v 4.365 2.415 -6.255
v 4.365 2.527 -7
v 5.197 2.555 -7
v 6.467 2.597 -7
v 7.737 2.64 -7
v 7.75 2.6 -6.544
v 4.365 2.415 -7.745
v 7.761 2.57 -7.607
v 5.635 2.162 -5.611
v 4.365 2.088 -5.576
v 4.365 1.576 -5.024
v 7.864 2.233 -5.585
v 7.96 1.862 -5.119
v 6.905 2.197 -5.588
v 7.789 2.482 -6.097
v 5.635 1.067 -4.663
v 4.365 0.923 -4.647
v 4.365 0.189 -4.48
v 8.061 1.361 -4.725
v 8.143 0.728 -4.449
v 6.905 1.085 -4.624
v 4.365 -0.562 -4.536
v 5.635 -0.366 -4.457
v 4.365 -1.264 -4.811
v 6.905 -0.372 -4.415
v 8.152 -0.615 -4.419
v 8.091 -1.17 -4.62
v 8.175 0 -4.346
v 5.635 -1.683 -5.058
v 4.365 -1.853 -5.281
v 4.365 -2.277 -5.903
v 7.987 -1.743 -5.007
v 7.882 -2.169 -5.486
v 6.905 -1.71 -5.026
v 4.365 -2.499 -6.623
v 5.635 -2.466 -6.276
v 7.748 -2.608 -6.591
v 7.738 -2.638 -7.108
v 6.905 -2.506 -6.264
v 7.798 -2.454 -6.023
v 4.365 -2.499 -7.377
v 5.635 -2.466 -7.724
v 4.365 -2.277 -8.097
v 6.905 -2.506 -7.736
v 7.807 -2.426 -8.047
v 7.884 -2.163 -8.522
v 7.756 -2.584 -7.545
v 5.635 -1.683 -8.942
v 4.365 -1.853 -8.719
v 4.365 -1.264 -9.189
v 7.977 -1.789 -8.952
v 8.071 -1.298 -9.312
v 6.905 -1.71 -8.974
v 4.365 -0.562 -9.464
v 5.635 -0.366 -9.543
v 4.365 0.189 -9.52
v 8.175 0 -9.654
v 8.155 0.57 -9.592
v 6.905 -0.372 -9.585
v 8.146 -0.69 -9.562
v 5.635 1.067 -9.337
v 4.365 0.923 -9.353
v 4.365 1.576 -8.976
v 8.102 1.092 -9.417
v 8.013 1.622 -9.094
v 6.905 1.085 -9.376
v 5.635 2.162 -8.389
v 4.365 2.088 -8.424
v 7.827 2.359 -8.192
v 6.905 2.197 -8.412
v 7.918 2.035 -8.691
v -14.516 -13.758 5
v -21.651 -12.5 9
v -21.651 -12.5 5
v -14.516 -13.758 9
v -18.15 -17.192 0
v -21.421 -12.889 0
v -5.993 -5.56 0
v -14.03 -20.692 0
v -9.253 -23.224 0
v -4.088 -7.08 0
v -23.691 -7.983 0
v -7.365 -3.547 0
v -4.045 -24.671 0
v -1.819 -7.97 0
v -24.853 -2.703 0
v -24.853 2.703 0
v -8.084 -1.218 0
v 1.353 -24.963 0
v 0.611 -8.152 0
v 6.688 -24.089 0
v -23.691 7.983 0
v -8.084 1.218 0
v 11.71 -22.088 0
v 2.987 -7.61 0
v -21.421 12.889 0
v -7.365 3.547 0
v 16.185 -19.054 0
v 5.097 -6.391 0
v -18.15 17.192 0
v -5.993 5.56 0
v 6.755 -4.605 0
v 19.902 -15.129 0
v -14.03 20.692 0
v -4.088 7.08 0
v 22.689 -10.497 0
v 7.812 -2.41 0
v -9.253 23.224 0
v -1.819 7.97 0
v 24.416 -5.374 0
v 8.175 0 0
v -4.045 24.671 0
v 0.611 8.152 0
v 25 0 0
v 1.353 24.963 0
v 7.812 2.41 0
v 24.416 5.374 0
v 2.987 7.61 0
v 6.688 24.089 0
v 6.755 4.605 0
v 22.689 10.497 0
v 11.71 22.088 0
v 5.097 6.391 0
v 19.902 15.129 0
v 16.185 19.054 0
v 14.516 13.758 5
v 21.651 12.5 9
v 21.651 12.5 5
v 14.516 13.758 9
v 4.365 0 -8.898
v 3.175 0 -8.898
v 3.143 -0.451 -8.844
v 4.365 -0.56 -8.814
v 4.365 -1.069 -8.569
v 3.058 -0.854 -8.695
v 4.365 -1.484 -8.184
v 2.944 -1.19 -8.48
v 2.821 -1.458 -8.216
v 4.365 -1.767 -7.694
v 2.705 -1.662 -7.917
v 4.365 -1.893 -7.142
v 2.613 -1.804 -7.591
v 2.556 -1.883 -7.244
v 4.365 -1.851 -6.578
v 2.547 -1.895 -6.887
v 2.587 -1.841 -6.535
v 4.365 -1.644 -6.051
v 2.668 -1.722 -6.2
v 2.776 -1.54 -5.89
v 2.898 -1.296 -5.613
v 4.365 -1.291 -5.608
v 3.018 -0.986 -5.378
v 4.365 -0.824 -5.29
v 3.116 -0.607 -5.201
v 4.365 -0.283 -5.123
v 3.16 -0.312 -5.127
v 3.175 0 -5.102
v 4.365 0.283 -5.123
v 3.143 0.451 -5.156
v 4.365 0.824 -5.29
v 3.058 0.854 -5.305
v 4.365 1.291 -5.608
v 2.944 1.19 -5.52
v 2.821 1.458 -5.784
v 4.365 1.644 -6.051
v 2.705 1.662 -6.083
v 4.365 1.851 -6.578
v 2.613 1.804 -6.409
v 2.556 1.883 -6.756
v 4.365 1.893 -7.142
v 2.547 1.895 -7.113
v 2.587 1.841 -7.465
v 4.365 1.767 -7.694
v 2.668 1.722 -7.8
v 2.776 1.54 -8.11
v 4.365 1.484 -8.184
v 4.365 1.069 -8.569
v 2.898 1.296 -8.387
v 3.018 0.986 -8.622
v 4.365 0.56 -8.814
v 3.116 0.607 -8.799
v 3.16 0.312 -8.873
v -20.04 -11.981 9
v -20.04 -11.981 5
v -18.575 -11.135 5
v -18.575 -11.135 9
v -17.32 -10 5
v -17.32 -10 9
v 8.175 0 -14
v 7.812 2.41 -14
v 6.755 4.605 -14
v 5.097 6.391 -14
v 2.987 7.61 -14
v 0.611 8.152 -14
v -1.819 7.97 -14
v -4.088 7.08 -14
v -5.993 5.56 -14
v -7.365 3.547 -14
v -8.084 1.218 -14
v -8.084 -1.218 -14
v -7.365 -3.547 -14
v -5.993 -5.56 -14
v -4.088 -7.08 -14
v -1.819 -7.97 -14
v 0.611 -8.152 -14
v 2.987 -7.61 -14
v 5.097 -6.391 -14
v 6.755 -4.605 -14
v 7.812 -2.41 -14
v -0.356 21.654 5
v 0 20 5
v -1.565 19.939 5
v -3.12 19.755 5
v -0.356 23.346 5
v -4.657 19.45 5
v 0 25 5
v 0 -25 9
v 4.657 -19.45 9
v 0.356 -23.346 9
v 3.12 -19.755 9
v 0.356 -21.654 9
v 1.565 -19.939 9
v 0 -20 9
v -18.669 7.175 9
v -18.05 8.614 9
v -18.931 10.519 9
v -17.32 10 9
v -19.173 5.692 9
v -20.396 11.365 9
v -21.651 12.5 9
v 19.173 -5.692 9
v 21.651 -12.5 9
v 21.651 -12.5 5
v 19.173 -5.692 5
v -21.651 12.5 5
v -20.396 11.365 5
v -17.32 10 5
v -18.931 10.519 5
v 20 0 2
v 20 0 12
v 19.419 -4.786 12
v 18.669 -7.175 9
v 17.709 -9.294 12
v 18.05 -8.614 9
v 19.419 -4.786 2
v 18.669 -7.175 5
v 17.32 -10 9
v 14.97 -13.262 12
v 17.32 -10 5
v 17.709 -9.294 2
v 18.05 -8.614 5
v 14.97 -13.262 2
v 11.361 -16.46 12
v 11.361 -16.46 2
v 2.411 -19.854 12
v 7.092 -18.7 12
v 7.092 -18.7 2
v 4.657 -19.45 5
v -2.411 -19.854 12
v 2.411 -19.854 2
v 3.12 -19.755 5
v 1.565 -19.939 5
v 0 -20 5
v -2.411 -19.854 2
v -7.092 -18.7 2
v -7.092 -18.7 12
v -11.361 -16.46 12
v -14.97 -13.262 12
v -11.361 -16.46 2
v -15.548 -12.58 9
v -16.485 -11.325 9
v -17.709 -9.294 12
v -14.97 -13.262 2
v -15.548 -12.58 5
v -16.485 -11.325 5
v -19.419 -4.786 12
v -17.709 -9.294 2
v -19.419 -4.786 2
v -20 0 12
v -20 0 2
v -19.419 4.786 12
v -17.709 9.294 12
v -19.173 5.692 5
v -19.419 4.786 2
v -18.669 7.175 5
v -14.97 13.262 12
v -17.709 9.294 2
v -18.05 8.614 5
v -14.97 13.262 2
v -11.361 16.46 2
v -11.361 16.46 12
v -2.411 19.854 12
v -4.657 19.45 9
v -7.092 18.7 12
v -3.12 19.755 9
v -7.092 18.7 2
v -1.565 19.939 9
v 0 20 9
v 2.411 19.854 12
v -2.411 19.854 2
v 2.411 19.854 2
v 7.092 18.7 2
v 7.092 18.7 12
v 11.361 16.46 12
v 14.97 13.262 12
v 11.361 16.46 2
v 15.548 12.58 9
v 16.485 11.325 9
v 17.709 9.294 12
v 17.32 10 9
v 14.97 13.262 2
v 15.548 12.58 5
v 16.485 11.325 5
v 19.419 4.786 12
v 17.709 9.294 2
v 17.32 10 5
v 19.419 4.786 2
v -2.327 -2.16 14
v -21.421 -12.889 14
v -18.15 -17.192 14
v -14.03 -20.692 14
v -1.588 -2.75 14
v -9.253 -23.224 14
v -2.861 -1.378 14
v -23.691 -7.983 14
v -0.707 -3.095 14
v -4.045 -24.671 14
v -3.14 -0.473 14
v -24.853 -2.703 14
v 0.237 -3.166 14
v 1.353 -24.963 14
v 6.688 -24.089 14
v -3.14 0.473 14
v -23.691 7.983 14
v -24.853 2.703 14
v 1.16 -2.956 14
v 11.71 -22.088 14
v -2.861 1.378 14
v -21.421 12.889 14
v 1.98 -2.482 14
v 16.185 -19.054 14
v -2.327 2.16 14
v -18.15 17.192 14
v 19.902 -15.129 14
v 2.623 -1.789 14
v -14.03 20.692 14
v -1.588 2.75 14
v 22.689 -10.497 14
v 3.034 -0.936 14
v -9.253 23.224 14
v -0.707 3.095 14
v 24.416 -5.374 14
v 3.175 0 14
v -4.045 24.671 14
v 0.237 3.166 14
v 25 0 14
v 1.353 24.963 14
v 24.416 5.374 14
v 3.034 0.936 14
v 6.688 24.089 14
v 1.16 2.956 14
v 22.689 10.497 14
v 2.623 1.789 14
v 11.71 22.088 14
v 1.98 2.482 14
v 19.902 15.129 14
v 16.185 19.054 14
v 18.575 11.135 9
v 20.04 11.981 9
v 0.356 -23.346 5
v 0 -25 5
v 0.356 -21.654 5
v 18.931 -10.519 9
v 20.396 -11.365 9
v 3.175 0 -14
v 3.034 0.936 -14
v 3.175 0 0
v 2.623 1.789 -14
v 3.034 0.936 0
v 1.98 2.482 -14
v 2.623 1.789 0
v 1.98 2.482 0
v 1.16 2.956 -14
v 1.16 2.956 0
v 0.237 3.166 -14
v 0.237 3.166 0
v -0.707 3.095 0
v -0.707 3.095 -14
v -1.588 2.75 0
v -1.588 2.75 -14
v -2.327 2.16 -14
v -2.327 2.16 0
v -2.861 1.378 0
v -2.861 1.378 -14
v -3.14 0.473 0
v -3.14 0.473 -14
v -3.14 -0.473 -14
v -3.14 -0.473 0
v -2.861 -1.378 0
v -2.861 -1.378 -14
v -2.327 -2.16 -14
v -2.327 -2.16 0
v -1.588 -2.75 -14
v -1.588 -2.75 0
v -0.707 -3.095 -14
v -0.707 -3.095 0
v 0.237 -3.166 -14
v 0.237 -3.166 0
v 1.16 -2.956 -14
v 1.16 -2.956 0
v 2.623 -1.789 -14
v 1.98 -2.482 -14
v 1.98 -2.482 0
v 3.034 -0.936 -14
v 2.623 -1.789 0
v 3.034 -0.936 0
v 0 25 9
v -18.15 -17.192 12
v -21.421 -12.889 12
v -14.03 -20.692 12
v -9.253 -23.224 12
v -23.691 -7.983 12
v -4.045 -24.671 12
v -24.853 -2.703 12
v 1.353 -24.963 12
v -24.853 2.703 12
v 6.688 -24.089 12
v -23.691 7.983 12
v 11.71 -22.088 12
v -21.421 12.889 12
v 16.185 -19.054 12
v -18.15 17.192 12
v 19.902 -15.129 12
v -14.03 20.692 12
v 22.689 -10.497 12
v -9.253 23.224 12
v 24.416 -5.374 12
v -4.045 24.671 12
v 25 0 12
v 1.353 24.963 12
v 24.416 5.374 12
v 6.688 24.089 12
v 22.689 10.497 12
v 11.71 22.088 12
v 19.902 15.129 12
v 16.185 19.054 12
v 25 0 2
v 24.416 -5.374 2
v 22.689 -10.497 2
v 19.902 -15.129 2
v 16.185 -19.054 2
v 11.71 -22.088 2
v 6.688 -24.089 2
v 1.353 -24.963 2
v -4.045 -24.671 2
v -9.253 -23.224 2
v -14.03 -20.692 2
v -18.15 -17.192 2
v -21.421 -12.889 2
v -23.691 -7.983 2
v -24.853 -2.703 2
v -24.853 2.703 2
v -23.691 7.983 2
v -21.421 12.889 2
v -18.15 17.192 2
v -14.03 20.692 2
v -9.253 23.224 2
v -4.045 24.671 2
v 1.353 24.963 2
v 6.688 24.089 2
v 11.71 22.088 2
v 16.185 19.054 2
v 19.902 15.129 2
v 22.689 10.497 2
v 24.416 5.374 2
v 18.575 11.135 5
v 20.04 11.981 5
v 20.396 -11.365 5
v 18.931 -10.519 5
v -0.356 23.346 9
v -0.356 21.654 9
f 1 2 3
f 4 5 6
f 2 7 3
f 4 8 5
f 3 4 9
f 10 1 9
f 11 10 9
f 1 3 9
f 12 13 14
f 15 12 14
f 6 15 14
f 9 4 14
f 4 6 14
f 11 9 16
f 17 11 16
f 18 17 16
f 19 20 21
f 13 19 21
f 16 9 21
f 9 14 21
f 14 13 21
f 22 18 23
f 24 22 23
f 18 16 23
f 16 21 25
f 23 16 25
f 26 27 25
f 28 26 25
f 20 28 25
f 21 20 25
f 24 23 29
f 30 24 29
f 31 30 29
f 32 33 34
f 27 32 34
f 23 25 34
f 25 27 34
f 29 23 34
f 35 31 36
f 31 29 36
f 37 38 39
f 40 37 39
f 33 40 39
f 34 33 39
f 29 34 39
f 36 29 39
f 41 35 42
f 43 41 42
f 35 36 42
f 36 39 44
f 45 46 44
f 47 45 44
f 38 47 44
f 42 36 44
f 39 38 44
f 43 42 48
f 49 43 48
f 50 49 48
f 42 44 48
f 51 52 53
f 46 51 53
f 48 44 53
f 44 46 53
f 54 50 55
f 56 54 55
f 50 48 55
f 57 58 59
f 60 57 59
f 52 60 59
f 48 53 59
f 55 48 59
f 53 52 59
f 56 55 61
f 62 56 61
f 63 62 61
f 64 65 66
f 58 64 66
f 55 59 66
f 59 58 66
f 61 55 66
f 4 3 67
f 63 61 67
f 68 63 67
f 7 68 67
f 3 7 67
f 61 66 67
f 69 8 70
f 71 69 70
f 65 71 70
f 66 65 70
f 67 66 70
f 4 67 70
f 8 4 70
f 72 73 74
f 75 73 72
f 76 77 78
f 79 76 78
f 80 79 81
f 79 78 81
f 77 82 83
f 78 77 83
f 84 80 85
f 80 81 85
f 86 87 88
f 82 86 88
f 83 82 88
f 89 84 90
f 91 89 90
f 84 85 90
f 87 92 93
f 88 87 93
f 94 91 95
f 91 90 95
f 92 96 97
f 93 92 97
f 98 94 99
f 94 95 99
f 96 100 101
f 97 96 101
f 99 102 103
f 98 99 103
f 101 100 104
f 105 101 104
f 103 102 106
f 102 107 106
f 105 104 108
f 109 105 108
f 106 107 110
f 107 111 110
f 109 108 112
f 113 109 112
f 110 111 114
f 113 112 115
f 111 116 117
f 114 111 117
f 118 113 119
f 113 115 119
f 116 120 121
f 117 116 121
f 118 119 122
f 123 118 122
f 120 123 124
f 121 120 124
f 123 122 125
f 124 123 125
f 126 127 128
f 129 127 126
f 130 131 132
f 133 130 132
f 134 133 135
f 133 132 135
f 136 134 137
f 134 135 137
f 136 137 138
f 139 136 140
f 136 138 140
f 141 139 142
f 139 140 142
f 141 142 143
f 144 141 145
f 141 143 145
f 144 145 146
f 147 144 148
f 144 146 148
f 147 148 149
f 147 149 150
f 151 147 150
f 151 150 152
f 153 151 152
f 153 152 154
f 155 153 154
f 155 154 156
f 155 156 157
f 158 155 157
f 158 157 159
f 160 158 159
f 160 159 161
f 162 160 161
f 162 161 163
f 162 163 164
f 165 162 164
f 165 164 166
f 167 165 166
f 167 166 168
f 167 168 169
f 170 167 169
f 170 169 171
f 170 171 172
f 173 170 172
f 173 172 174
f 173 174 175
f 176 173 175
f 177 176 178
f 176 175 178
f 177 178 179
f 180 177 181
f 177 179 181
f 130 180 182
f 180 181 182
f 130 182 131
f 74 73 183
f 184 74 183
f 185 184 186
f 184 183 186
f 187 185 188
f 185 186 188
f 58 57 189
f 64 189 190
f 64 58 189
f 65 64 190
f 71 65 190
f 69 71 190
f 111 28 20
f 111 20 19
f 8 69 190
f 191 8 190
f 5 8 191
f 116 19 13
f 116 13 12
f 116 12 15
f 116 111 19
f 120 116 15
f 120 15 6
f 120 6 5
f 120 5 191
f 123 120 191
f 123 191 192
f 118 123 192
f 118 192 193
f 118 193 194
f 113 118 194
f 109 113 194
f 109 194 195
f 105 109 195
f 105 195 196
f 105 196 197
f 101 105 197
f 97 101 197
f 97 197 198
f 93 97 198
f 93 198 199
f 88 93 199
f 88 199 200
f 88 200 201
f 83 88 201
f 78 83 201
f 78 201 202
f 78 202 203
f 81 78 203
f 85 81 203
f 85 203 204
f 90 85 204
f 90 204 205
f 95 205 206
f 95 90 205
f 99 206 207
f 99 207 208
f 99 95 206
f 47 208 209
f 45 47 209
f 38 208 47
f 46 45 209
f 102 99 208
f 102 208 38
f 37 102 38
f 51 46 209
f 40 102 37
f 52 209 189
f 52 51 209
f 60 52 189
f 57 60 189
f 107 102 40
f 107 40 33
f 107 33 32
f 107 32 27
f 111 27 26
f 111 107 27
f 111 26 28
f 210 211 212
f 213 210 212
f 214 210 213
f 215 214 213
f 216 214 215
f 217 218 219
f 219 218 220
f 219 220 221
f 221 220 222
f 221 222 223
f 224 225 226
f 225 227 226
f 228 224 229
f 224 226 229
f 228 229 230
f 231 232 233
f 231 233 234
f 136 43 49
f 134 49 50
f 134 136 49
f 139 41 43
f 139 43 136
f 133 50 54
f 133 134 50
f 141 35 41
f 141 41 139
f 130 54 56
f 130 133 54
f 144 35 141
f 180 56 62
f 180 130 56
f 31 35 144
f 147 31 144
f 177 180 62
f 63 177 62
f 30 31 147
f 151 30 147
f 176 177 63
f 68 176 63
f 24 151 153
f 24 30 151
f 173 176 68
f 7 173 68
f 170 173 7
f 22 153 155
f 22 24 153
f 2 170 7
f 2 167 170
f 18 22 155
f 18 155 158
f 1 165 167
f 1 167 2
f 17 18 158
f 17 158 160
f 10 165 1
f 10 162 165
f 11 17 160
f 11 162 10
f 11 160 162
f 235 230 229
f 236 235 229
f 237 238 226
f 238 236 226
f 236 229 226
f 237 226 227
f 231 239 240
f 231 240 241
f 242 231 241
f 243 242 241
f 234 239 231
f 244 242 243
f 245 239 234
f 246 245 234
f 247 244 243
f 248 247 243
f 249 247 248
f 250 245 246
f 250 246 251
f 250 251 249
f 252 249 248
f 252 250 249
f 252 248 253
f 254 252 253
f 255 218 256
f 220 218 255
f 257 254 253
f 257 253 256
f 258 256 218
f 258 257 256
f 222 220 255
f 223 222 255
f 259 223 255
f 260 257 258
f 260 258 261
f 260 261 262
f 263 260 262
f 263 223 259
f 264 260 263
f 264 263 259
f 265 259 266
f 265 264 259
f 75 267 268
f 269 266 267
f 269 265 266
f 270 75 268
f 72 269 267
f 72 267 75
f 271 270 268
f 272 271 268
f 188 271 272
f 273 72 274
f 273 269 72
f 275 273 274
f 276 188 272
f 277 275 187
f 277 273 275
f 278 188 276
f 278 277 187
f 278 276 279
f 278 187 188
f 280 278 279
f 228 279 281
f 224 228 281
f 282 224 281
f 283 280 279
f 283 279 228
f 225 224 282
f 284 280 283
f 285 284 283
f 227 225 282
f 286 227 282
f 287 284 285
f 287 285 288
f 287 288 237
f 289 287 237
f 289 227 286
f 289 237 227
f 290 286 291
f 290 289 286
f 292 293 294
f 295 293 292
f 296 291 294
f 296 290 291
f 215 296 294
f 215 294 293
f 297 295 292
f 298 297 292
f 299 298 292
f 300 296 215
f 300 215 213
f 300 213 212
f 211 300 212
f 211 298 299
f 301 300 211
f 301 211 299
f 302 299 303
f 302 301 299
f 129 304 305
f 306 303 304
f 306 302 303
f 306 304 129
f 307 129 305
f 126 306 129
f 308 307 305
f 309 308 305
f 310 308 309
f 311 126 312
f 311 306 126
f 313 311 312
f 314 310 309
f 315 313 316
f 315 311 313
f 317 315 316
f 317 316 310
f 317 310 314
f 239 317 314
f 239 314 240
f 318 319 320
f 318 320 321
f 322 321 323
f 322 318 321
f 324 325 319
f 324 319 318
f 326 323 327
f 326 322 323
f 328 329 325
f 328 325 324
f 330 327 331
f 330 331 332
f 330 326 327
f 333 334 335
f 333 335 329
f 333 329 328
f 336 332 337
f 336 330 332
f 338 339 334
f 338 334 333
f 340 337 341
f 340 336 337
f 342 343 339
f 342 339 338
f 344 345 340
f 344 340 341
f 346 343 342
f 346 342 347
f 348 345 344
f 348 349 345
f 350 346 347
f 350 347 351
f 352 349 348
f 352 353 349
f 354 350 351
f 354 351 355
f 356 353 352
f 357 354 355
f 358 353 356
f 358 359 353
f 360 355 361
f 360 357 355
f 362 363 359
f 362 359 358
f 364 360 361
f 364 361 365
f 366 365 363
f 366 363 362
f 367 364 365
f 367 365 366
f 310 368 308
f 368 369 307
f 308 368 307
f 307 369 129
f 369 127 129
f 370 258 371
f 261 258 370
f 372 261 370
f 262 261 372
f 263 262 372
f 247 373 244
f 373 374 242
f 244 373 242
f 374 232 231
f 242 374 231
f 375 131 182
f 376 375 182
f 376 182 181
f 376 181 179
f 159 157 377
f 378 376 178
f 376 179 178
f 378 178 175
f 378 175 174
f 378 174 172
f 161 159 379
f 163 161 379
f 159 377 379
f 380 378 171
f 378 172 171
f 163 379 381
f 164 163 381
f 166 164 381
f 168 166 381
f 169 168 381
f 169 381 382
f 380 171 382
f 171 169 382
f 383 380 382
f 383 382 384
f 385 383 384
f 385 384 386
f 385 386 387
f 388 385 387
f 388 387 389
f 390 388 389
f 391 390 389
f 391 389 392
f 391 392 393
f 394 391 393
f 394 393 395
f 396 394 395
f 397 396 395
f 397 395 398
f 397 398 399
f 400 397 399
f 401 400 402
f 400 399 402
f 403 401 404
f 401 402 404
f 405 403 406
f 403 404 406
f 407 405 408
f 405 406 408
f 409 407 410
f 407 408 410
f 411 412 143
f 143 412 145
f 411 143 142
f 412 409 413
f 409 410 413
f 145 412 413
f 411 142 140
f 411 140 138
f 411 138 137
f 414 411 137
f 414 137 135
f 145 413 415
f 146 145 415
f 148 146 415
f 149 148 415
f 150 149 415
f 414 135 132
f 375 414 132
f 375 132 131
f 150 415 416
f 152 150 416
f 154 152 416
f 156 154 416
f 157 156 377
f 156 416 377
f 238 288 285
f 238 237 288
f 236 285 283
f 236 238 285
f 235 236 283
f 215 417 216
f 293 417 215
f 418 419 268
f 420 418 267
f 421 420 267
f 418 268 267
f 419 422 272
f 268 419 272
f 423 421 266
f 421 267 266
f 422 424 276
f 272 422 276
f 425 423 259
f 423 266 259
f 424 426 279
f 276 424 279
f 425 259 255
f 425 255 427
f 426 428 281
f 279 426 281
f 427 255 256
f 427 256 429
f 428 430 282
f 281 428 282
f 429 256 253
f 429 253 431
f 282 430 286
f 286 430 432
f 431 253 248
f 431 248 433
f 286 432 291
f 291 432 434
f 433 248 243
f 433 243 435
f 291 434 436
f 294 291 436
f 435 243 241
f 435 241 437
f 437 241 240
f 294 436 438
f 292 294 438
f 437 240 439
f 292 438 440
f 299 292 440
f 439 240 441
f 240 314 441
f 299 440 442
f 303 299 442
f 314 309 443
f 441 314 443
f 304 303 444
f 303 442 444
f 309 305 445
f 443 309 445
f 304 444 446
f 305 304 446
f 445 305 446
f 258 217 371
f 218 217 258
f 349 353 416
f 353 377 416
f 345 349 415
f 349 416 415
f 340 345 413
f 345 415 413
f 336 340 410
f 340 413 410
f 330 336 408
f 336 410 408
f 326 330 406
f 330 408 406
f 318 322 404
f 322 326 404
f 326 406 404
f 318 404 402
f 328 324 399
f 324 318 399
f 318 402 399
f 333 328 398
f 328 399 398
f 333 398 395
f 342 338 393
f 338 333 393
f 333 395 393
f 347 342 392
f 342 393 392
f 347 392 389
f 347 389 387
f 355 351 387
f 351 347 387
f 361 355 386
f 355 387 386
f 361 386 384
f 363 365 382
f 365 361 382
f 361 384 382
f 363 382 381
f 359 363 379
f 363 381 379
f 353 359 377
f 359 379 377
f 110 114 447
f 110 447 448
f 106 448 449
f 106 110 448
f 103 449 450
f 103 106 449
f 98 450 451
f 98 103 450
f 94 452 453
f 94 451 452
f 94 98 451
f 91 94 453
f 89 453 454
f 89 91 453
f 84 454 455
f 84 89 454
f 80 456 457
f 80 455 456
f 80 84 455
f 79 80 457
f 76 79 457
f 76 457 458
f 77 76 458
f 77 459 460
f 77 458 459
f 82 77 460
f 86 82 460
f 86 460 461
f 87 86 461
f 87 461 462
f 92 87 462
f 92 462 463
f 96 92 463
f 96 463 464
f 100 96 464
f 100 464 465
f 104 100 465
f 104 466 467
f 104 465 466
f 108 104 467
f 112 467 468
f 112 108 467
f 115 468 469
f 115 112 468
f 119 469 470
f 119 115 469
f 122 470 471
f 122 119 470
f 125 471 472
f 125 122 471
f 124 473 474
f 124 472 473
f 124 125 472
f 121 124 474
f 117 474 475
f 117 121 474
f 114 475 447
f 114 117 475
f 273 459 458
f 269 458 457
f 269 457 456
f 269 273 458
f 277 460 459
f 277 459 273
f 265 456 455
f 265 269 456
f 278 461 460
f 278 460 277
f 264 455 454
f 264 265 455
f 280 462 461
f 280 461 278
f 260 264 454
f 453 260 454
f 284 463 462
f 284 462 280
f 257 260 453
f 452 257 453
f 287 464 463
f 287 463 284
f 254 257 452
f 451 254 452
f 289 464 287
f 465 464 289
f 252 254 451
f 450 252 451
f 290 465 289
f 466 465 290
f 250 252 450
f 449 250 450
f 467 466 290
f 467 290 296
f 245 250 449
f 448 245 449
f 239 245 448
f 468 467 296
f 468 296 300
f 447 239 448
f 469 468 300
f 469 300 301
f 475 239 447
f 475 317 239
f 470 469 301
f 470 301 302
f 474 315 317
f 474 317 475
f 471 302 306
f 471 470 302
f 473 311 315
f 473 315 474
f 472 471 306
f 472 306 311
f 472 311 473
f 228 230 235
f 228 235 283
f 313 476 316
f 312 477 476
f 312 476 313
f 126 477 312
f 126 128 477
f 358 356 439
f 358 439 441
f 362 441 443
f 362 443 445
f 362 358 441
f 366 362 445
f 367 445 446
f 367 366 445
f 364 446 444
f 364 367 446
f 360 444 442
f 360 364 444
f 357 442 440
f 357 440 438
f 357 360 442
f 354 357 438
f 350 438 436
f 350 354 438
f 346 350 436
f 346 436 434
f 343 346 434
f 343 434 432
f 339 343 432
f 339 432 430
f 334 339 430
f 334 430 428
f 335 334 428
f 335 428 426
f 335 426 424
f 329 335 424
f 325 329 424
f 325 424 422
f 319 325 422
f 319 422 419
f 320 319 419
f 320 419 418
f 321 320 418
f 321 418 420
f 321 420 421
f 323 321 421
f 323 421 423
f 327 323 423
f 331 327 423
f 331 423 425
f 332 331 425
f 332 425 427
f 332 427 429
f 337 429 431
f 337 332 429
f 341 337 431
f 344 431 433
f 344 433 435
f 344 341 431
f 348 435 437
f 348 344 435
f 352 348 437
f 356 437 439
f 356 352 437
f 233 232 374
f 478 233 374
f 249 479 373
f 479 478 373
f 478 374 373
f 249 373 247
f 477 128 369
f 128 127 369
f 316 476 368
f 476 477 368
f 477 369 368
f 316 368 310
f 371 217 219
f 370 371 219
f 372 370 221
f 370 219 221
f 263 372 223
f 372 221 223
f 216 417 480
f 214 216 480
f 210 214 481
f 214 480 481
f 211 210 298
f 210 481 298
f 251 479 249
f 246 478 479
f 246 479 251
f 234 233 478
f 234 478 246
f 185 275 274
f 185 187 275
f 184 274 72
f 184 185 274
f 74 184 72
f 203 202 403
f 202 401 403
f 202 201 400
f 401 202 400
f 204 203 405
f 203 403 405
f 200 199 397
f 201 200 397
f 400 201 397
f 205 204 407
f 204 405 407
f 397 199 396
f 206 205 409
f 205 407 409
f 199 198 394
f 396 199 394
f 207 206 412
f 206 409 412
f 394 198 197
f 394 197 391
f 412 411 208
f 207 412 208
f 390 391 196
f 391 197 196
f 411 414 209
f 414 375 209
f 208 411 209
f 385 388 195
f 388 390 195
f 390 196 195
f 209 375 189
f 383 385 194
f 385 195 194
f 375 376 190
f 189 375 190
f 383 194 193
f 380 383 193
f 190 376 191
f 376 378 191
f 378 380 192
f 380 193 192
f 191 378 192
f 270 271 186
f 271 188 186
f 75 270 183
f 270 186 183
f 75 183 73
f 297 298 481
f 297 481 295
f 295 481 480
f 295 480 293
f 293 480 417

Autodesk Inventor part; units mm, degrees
ref_plane "XZ Plane" through (0, 0, 0) normal (0, 1, 0) x (-1, 0, 0)
sketch "Sketch1" plane through (0, 0, 0) normal (0, 0, 1) x (1, 0, 0)
  circle A0 centre (0, 0) radius 20
  circle A1 centre (0, 0) radius 25
  circle A2 centre (0, 0) radius 3.175
  circle A3 centre (0, 0) radius 8.175
  dimension "d18" = 6.35
  dimension "d19" = 16.35
  dimension "d40" = 40
  dimension "d41" = 5
extrude "Extrusion1" add sketch "Sketch1" along normal blind 14 contours A0 | A2 | A3
extrude "Extrusion2" add sketch "Sketch1" along normal blind 2 contours A1
sketch "Sketch2" plane through (0, 0, 14) normal (0, 0, 1) x (1, 0, 0)
  circle A0 centre (0, 0) radius 20 projected
  circle A1 centre (0, 0) radius 25 projected
extrude "Extrusion3" add sketch "Sketch2" against normal blind 2
ref_plane "Work Plane1" through (0, 0, 7) normal (0, 0, -1) x (-1, 0, 0)
extrude "Extrusion5" cut sketch "Sketch1" along normal up to surface (14 mm away) contours A2
extrude "Extrusion6" add sketch "Sketch1" against normal blind 14 contours A3
ref_plane "Work Plane2" through (8.175, 0, 0) normal (1, 0, 0) x (0, 1, 0)
sketch "Sketch9" plane through (0, 0, 7) normal (0, 0, -1) x (-1, 0, 0)
  circle A0 centre (0, 0) radius 20 projected
  line L0 (0, -20) -> (0, -25) construction
  circle A1 centre (0, 0) radius 25 projected
  arc A2 (0, -20) -> (0, -25) centre (7.5993, -22.5) ccw
  line L1 (0, -25) -> (-4.6567, -19.4503)
  circle A3 centre (0, 0) radius 20
  line L2 (17.3205, -10) -> (21.6506, -12.5) construction
  line L3 (21.6506, -12.5) -> (14.5161, -13.758)
  arc A4 (17.3205, -10) -> (21.6506, -12.5) centre (23.2852, -4.6688) ccw
  line L4 (17.3205, 10) -> (21.6506, 12.5) construction
  line L5 (21.6506, 12.5) -> (19.1728, 5.6923)
  arc A5 (17.3205, 10) -> (21.6506, 12.5) centre (15.6859, 17.8312) ccw
  line L6 (0, 20) -> (0, 25) construction
  line L7 (0, 25) -> (4.6567, 19.4503)
  arc A6 (0, 20) -> (0, 25) centre (-7.5993, 22.5) ccw
  line L8 (-17.3205, 10) -> (-21.6506, 12.5) construction
  line L9 (-21.6506, 12.5) -> (-14.5161, 13.758)
  arc A7 (-17.3205, 10) -> (-21.6506, 12.5) centre (-23.2852, 4.6688) ccw
  line L10 (-17.3205, -10) -> (-21.6506, -12.5) construction
  line L11 (-21.6506, -12.5) -> (-19.1728, -5.6923)
  arc A8 (-17.3205, -10) -> (-21.6506, -12.5) centre (-15.6859, -17.8312) ccw
  point P0 (0, -22.5)
  point P1 (19.4856, -11.25)
  point P2 (19.4856, 11.25)
  point P3 (0, 22.5)
  point P4 (-19.4856, 11.25)
  point P5 (-19.4856, -11.25)
  dimension "d58" = 8
  dimension "d59" = 40
  dimension "d62" = 360
extrude "Extrusion9" add sketch "Sketch9" along normal mid plane 4 contours A0 A5 L5 | A4 L3 A0 | A0 A6 L7 | A2 L1 A0 | L9 A0 A7 | L11 A0 A8
sketch "Sketch10" plane through (8.175, 0, 0) normal (1, 0, 0) x (0, 1, 0)
  line L0 (0, 0) -> (0, -14) construction
  line L1 (-8.175, -14) -> (8.175, -14) construction
  circle A0 centre (0, -7) radius 2.6543
  circle A1 centre (0, -7) radius 2.5273
  dimension "d66" = 5.3086
  dimension "d67" = 5.0546
extrude "Extrusion10" cut sketch "Sketch10" against normal blind 3.81 contours A1
loft "Loft1" cut profiles "Sketch10" section 2 edges at (4.365, -2.5273, -7) contours A0 | A1
hole "Hole2" at (8.175, 0, -7) direction (-1, 0, 0) diameter 3.797 end up to surface clearance for "Flat Head Machine Screw (82)" size "#6" standard "Ansi Unified Screw Threads"
properties part number "intermediateSpindle"
